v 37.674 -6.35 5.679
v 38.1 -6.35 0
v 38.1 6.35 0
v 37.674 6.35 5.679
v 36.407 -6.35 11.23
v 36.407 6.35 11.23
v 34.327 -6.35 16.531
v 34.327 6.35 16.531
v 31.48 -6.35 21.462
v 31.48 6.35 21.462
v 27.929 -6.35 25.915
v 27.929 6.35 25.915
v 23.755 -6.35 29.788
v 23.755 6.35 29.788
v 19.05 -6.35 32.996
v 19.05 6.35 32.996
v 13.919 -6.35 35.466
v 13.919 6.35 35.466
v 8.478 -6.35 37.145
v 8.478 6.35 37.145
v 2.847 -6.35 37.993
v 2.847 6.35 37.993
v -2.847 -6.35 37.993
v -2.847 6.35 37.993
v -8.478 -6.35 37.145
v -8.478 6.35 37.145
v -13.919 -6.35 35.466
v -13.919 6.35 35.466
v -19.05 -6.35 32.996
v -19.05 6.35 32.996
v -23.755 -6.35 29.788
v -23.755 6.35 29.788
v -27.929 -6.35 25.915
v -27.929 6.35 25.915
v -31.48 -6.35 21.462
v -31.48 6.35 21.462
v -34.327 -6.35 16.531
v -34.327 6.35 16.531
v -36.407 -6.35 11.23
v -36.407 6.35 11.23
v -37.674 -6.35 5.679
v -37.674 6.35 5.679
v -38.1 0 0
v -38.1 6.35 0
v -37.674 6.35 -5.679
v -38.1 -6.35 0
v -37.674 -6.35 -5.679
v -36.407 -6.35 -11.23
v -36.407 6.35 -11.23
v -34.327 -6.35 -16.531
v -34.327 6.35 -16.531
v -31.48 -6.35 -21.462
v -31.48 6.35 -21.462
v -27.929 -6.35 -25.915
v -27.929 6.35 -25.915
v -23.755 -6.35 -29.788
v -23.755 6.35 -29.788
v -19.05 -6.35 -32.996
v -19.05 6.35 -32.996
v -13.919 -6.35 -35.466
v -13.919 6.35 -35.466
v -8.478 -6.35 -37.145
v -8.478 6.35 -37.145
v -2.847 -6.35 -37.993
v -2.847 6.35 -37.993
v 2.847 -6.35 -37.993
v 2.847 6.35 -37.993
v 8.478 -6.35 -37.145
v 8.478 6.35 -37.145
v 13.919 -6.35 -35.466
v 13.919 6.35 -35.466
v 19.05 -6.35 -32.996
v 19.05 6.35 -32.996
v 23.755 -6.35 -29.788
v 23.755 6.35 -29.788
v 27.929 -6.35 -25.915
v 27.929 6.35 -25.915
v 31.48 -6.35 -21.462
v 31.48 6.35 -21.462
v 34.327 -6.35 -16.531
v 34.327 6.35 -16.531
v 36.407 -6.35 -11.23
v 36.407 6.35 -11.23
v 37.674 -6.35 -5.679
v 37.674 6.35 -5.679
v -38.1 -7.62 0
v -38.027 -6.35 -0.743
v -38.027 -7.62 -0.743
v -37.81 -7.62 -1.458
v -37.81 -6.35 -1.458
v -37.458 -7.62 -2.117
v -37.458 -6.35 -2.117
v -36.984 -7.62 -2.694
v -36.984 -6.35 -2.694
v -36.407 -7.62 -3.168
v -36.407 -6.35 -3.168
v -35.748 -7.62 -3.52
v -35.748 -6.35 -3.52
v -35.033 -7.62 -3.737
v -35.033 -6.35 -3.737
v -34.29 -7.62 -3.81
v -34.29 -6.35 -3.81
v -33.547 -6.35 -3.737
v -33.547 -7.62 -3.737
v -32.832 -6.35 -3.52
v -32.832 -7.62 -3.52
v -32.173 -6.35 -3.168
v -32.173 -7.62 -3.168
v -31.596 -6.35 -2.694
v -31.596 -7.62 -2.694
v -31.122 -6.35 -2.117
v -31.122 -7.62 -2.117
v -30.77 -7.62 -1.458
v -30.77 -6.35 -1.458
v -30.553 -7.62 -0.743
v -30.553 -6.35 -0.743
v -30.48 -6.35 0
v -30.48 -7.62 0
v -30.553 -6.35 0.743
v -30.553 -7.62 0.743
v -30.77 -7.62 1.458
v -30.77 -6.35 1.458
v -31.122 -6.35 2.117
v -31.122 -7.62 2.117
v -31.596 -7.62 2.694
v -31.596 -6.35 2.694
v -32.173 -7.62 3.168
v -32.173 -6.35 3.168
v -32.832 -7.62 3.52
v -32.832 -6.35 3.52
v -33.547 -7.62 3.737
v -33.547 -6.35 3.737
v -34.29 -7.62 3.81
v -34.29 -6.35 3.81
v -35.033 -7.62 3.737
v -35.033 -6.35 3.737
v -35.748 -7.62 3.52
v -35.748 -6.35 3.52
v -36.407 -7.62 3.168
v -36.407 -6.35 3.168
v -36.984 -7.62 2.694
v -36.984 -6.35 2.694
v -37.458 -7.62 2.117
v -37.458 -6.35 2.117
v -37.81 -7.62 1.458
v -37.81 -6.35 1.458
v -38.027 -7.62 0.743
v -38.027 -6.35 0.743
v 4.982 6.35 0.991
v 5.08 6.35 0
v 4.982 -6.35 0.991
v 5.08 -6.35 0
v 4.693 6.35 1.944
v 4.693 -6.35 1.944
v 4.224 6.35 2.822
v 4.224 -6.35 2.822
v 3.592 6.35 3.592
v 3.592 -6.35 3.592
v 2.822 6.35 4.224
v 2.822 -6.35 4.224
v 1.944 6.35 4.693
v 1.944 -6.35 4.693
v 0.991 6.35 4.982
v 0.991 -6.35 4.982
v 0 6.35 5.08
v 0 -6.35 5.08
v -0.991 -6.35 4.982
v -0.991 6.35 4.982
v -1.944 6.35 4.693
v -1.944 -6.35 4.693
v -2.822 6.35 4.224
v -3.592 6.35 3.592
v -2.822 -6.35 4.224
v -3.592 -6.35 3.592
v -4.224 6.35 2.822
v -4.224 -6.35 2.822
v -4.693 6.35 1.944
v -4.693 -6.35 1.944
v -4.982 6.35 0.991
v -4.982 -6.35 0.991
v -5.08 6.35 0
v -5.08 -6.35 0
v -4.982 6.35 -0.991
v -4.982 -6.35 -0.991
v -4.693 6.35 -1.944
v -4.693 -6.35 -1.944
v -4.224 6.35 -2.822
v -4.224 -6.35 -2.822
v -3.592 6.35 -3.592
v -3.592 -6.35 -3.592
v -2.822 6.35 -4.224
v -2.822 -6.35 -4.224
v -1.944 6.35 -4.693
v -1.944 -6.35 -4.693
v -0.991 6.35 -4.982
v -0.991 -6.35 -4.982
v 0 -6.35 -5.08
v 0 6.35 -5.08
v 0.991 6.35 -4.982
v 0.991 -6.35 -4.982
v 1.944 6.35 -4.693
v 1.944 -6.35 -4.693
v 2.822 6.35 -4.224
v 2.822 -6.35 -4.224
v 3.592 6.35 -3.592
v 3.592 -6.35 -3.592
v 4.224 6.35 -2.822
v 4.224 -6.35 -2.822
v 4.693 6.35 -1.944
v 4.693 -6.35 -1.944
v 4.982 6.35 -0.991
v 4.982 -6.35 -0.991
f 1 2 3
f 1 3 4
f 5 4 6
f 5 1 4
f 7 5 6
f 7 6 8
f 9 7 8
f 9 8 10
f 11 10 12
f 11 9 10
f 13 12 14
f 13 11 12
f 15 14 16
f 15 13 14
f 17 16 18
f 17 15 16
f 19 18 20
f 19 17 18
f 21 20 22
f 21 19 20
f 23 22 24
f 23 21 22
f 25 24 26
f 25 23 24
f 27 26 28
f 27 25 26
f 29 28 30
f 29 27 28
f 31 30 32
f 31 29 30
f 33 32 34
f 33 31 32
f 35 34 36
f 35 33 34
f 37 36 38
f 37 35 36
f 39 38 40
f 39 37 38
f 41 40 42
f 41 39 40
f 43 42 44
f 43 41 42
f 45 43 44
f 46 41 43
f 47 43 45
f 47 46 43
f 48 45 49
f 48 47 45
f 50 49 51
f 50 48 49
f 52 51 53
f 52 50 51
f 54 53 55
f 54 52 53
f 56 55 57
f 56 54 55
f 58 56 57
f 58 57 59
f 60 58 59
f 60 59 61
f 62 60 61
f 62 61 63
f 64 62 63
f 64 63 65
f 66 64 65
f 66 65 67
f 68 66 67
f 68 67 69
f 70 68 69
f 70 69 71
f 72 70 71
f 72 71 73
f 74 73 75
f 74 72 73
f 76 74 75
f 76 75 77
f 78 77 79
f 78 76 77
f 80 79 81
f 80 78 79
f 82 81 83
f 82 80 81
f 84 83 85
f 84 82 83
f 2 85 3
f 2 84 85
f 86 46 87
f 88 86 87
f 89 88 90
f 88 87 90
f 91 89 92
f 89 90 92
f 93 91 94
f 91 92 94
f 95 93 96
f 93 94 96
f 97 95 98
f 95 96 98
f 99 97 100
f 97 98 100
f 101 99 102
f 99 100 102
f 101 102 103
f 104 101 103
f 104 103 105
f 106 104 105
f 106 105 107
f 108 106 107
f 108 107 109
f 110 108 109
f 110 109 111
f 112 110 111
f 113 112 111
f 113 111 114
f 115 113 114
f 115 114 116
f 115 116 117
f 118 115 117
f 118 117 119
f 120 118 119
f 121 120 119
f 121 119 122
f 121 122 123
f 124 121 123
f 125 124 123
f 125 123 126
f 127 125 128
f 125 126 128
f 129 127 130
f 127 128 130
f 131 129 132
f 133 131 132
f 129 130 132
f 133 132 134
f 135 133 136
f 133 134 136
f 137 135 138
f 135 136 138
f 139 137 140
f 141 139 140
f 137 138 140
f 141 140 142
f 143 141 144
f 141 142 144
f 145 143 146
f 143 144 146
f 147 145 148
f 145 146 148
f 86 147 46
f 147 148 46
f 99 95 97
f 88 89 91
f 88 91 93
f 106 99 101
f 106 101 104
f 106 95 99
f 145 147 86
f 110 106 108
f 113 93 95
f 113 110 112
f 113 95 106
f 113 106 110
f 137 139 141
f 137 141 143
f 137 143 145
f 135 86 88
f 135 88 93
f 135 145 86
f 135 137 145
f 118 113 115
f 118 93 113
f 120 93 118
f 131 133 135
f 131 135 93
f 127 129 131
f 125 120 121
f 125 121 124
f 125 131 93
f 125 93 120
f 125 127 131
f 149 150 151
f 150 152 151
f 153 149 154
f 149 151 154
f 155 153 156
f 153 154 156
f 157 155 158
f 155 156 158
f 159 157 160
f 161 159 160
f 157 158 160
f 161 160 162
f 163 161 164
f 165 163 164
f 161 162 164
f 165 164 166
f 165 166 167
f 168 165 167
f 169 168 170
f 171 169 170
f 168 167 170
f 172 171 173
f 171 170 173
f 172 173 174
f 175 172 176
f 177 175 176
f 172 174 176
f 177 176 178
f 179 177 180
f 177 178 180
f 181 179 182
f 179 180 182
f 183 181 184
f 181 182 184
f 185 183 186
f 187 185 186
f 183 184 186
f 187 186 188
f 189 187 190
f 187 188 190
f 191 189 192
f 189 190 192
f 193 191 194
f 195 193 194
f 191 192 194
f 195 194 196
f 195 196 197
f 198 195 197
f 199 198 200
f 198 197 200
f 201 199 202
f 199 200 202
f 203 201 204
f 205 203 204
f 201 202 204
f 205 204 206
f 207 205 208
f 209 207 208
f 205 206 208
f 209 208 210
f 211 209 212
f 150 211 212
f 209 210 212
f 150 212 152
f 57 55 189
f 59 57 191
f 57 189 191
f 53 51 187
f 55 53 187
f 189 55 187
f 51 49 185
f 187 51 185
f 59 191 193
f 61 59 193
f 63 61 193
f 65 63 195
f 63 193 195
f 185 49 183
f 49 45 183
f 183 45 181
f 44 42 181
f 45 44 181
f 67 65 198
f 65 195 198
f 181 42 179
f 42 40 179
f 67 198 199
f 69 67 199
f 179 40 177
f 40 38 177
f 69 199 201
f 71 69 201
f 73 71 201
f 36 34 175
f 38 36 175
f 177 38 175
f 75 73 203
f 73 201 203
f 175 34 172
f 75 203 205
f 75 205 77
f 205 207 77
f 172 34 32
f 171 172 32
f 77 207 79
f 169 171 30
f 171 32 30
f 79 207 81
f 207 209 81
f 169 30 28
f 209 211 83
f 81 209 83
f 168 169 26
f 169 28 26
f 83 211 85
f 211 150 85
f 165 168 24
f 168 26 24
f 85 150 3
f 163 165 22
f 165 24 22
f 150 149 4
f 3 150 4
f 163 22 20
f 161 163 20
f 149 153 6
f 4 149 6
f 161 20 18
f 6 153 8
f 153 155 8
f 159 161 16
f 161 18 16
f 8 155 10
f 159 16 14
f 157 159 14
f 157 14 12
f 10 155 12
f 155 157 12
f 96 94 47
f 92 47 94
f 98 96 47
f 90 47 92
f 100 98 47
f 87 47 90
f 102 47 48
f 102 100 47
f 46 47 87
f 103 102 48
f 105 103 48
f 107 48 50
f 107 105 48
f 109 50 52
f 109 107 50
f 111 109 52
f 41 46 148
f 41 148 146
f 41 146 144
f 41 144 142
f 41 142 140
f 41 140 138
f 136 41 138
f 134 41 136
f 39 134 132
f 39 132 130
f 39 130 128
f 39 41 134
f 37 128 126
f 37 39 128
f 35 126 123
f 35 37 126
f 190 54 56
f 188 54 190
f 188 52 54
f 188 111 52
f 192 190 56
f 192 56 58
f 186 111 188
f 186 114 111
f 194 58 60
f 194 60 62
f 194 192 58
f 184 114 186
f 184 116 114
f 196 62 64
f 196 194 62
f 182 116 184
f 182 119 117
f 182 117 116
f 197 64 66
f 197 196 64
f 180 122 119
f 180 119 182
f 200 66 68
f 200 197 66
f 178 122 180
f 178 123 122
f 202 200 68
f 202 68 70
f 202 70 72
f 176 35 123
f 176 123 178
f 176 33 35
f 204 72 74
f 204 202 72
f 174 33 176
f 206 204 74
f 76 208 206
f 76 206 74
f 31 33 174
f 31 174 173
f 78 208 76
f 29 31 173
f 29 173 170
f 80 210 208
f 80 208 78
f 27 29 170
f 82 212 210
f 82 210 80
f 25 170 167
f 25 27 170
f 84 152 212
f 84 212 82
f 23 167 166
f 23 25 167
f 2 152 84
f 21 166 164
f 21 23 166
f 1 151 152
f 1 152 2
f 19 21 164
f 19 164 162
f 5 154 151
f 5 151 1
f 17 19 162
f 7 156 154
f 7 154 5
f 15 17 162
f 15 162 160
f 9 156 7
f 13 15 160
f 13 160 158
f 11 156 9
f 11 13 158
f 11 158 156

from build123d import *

# Parameters (mm, degrees)
F0_R     = 3.81
F1_DEPTH = 6.35
F2_T     = -33.02
F3_DEPTH = 7.62


with BuildPart() as f1:
    # F0 (on Front) → F1 (new body, symmetric)
    with BuildSketch(Plane.XZ):
        with BuildLine():
            ThreePointArc((-38.1, 1.128e-07), (-5.64e-08, -38.1), (38.1, 0))
            ThreePointArc((38.1, 0), (5.64e-08, 38.1), (-38.1, 1.128e-07))
        make_face()
        with BuildLine():
            ThreePointArc((-30.48, 0), (-34.2900000564, -3.81), (-38.1, 1.128e-07))
            ThreePointArc((-38.1, 1.128e-07), (-34.2899999436, 3.81), (-30.48, 0))
        make_face(mode=Mode.SUBTRACT)
        with Locations((34.29, 0)):
            Circle(F0_R, mode=Mode.SUBTRACT)
        with BuildLine():
            ThreePointArc((-30.48, 0), (-34.2899999436, 3.81), (-38.1, 1.128e-07))
            ThreePointArc((-38.1, 1.128e-07), (-34.2900000564, -3.81), (-30.48, 0))
        make_face()
        with Locations((34.29, 0)):
            Circle(F0_R)
    extrude(amount=F1_DEPTH, both=True)

    # F2
    f2_openings = [f1.faces().sort_by_distance(p)[0] for p in [
        (0, -6.35, 0),
        (0, 6.35, 0),
    ]]
    offset(amount=F2_T, openings=f2_openings)

    # F0 (on Front) → F3 (join)
    with BuildSketch(Plane.XZ):
        with BuildLine():
            ThreePointArc((-30.48, 0), (-34.2899999436, 3.81), (-38.1, 1.128e-07))
            ThreePointArc((-38.1, 1.128e-07), (-34.2900000564, -3.81), (-30.48, 0))
        make_face()
    extrude(amount=F3_DEPTH)


solid = f1.part
